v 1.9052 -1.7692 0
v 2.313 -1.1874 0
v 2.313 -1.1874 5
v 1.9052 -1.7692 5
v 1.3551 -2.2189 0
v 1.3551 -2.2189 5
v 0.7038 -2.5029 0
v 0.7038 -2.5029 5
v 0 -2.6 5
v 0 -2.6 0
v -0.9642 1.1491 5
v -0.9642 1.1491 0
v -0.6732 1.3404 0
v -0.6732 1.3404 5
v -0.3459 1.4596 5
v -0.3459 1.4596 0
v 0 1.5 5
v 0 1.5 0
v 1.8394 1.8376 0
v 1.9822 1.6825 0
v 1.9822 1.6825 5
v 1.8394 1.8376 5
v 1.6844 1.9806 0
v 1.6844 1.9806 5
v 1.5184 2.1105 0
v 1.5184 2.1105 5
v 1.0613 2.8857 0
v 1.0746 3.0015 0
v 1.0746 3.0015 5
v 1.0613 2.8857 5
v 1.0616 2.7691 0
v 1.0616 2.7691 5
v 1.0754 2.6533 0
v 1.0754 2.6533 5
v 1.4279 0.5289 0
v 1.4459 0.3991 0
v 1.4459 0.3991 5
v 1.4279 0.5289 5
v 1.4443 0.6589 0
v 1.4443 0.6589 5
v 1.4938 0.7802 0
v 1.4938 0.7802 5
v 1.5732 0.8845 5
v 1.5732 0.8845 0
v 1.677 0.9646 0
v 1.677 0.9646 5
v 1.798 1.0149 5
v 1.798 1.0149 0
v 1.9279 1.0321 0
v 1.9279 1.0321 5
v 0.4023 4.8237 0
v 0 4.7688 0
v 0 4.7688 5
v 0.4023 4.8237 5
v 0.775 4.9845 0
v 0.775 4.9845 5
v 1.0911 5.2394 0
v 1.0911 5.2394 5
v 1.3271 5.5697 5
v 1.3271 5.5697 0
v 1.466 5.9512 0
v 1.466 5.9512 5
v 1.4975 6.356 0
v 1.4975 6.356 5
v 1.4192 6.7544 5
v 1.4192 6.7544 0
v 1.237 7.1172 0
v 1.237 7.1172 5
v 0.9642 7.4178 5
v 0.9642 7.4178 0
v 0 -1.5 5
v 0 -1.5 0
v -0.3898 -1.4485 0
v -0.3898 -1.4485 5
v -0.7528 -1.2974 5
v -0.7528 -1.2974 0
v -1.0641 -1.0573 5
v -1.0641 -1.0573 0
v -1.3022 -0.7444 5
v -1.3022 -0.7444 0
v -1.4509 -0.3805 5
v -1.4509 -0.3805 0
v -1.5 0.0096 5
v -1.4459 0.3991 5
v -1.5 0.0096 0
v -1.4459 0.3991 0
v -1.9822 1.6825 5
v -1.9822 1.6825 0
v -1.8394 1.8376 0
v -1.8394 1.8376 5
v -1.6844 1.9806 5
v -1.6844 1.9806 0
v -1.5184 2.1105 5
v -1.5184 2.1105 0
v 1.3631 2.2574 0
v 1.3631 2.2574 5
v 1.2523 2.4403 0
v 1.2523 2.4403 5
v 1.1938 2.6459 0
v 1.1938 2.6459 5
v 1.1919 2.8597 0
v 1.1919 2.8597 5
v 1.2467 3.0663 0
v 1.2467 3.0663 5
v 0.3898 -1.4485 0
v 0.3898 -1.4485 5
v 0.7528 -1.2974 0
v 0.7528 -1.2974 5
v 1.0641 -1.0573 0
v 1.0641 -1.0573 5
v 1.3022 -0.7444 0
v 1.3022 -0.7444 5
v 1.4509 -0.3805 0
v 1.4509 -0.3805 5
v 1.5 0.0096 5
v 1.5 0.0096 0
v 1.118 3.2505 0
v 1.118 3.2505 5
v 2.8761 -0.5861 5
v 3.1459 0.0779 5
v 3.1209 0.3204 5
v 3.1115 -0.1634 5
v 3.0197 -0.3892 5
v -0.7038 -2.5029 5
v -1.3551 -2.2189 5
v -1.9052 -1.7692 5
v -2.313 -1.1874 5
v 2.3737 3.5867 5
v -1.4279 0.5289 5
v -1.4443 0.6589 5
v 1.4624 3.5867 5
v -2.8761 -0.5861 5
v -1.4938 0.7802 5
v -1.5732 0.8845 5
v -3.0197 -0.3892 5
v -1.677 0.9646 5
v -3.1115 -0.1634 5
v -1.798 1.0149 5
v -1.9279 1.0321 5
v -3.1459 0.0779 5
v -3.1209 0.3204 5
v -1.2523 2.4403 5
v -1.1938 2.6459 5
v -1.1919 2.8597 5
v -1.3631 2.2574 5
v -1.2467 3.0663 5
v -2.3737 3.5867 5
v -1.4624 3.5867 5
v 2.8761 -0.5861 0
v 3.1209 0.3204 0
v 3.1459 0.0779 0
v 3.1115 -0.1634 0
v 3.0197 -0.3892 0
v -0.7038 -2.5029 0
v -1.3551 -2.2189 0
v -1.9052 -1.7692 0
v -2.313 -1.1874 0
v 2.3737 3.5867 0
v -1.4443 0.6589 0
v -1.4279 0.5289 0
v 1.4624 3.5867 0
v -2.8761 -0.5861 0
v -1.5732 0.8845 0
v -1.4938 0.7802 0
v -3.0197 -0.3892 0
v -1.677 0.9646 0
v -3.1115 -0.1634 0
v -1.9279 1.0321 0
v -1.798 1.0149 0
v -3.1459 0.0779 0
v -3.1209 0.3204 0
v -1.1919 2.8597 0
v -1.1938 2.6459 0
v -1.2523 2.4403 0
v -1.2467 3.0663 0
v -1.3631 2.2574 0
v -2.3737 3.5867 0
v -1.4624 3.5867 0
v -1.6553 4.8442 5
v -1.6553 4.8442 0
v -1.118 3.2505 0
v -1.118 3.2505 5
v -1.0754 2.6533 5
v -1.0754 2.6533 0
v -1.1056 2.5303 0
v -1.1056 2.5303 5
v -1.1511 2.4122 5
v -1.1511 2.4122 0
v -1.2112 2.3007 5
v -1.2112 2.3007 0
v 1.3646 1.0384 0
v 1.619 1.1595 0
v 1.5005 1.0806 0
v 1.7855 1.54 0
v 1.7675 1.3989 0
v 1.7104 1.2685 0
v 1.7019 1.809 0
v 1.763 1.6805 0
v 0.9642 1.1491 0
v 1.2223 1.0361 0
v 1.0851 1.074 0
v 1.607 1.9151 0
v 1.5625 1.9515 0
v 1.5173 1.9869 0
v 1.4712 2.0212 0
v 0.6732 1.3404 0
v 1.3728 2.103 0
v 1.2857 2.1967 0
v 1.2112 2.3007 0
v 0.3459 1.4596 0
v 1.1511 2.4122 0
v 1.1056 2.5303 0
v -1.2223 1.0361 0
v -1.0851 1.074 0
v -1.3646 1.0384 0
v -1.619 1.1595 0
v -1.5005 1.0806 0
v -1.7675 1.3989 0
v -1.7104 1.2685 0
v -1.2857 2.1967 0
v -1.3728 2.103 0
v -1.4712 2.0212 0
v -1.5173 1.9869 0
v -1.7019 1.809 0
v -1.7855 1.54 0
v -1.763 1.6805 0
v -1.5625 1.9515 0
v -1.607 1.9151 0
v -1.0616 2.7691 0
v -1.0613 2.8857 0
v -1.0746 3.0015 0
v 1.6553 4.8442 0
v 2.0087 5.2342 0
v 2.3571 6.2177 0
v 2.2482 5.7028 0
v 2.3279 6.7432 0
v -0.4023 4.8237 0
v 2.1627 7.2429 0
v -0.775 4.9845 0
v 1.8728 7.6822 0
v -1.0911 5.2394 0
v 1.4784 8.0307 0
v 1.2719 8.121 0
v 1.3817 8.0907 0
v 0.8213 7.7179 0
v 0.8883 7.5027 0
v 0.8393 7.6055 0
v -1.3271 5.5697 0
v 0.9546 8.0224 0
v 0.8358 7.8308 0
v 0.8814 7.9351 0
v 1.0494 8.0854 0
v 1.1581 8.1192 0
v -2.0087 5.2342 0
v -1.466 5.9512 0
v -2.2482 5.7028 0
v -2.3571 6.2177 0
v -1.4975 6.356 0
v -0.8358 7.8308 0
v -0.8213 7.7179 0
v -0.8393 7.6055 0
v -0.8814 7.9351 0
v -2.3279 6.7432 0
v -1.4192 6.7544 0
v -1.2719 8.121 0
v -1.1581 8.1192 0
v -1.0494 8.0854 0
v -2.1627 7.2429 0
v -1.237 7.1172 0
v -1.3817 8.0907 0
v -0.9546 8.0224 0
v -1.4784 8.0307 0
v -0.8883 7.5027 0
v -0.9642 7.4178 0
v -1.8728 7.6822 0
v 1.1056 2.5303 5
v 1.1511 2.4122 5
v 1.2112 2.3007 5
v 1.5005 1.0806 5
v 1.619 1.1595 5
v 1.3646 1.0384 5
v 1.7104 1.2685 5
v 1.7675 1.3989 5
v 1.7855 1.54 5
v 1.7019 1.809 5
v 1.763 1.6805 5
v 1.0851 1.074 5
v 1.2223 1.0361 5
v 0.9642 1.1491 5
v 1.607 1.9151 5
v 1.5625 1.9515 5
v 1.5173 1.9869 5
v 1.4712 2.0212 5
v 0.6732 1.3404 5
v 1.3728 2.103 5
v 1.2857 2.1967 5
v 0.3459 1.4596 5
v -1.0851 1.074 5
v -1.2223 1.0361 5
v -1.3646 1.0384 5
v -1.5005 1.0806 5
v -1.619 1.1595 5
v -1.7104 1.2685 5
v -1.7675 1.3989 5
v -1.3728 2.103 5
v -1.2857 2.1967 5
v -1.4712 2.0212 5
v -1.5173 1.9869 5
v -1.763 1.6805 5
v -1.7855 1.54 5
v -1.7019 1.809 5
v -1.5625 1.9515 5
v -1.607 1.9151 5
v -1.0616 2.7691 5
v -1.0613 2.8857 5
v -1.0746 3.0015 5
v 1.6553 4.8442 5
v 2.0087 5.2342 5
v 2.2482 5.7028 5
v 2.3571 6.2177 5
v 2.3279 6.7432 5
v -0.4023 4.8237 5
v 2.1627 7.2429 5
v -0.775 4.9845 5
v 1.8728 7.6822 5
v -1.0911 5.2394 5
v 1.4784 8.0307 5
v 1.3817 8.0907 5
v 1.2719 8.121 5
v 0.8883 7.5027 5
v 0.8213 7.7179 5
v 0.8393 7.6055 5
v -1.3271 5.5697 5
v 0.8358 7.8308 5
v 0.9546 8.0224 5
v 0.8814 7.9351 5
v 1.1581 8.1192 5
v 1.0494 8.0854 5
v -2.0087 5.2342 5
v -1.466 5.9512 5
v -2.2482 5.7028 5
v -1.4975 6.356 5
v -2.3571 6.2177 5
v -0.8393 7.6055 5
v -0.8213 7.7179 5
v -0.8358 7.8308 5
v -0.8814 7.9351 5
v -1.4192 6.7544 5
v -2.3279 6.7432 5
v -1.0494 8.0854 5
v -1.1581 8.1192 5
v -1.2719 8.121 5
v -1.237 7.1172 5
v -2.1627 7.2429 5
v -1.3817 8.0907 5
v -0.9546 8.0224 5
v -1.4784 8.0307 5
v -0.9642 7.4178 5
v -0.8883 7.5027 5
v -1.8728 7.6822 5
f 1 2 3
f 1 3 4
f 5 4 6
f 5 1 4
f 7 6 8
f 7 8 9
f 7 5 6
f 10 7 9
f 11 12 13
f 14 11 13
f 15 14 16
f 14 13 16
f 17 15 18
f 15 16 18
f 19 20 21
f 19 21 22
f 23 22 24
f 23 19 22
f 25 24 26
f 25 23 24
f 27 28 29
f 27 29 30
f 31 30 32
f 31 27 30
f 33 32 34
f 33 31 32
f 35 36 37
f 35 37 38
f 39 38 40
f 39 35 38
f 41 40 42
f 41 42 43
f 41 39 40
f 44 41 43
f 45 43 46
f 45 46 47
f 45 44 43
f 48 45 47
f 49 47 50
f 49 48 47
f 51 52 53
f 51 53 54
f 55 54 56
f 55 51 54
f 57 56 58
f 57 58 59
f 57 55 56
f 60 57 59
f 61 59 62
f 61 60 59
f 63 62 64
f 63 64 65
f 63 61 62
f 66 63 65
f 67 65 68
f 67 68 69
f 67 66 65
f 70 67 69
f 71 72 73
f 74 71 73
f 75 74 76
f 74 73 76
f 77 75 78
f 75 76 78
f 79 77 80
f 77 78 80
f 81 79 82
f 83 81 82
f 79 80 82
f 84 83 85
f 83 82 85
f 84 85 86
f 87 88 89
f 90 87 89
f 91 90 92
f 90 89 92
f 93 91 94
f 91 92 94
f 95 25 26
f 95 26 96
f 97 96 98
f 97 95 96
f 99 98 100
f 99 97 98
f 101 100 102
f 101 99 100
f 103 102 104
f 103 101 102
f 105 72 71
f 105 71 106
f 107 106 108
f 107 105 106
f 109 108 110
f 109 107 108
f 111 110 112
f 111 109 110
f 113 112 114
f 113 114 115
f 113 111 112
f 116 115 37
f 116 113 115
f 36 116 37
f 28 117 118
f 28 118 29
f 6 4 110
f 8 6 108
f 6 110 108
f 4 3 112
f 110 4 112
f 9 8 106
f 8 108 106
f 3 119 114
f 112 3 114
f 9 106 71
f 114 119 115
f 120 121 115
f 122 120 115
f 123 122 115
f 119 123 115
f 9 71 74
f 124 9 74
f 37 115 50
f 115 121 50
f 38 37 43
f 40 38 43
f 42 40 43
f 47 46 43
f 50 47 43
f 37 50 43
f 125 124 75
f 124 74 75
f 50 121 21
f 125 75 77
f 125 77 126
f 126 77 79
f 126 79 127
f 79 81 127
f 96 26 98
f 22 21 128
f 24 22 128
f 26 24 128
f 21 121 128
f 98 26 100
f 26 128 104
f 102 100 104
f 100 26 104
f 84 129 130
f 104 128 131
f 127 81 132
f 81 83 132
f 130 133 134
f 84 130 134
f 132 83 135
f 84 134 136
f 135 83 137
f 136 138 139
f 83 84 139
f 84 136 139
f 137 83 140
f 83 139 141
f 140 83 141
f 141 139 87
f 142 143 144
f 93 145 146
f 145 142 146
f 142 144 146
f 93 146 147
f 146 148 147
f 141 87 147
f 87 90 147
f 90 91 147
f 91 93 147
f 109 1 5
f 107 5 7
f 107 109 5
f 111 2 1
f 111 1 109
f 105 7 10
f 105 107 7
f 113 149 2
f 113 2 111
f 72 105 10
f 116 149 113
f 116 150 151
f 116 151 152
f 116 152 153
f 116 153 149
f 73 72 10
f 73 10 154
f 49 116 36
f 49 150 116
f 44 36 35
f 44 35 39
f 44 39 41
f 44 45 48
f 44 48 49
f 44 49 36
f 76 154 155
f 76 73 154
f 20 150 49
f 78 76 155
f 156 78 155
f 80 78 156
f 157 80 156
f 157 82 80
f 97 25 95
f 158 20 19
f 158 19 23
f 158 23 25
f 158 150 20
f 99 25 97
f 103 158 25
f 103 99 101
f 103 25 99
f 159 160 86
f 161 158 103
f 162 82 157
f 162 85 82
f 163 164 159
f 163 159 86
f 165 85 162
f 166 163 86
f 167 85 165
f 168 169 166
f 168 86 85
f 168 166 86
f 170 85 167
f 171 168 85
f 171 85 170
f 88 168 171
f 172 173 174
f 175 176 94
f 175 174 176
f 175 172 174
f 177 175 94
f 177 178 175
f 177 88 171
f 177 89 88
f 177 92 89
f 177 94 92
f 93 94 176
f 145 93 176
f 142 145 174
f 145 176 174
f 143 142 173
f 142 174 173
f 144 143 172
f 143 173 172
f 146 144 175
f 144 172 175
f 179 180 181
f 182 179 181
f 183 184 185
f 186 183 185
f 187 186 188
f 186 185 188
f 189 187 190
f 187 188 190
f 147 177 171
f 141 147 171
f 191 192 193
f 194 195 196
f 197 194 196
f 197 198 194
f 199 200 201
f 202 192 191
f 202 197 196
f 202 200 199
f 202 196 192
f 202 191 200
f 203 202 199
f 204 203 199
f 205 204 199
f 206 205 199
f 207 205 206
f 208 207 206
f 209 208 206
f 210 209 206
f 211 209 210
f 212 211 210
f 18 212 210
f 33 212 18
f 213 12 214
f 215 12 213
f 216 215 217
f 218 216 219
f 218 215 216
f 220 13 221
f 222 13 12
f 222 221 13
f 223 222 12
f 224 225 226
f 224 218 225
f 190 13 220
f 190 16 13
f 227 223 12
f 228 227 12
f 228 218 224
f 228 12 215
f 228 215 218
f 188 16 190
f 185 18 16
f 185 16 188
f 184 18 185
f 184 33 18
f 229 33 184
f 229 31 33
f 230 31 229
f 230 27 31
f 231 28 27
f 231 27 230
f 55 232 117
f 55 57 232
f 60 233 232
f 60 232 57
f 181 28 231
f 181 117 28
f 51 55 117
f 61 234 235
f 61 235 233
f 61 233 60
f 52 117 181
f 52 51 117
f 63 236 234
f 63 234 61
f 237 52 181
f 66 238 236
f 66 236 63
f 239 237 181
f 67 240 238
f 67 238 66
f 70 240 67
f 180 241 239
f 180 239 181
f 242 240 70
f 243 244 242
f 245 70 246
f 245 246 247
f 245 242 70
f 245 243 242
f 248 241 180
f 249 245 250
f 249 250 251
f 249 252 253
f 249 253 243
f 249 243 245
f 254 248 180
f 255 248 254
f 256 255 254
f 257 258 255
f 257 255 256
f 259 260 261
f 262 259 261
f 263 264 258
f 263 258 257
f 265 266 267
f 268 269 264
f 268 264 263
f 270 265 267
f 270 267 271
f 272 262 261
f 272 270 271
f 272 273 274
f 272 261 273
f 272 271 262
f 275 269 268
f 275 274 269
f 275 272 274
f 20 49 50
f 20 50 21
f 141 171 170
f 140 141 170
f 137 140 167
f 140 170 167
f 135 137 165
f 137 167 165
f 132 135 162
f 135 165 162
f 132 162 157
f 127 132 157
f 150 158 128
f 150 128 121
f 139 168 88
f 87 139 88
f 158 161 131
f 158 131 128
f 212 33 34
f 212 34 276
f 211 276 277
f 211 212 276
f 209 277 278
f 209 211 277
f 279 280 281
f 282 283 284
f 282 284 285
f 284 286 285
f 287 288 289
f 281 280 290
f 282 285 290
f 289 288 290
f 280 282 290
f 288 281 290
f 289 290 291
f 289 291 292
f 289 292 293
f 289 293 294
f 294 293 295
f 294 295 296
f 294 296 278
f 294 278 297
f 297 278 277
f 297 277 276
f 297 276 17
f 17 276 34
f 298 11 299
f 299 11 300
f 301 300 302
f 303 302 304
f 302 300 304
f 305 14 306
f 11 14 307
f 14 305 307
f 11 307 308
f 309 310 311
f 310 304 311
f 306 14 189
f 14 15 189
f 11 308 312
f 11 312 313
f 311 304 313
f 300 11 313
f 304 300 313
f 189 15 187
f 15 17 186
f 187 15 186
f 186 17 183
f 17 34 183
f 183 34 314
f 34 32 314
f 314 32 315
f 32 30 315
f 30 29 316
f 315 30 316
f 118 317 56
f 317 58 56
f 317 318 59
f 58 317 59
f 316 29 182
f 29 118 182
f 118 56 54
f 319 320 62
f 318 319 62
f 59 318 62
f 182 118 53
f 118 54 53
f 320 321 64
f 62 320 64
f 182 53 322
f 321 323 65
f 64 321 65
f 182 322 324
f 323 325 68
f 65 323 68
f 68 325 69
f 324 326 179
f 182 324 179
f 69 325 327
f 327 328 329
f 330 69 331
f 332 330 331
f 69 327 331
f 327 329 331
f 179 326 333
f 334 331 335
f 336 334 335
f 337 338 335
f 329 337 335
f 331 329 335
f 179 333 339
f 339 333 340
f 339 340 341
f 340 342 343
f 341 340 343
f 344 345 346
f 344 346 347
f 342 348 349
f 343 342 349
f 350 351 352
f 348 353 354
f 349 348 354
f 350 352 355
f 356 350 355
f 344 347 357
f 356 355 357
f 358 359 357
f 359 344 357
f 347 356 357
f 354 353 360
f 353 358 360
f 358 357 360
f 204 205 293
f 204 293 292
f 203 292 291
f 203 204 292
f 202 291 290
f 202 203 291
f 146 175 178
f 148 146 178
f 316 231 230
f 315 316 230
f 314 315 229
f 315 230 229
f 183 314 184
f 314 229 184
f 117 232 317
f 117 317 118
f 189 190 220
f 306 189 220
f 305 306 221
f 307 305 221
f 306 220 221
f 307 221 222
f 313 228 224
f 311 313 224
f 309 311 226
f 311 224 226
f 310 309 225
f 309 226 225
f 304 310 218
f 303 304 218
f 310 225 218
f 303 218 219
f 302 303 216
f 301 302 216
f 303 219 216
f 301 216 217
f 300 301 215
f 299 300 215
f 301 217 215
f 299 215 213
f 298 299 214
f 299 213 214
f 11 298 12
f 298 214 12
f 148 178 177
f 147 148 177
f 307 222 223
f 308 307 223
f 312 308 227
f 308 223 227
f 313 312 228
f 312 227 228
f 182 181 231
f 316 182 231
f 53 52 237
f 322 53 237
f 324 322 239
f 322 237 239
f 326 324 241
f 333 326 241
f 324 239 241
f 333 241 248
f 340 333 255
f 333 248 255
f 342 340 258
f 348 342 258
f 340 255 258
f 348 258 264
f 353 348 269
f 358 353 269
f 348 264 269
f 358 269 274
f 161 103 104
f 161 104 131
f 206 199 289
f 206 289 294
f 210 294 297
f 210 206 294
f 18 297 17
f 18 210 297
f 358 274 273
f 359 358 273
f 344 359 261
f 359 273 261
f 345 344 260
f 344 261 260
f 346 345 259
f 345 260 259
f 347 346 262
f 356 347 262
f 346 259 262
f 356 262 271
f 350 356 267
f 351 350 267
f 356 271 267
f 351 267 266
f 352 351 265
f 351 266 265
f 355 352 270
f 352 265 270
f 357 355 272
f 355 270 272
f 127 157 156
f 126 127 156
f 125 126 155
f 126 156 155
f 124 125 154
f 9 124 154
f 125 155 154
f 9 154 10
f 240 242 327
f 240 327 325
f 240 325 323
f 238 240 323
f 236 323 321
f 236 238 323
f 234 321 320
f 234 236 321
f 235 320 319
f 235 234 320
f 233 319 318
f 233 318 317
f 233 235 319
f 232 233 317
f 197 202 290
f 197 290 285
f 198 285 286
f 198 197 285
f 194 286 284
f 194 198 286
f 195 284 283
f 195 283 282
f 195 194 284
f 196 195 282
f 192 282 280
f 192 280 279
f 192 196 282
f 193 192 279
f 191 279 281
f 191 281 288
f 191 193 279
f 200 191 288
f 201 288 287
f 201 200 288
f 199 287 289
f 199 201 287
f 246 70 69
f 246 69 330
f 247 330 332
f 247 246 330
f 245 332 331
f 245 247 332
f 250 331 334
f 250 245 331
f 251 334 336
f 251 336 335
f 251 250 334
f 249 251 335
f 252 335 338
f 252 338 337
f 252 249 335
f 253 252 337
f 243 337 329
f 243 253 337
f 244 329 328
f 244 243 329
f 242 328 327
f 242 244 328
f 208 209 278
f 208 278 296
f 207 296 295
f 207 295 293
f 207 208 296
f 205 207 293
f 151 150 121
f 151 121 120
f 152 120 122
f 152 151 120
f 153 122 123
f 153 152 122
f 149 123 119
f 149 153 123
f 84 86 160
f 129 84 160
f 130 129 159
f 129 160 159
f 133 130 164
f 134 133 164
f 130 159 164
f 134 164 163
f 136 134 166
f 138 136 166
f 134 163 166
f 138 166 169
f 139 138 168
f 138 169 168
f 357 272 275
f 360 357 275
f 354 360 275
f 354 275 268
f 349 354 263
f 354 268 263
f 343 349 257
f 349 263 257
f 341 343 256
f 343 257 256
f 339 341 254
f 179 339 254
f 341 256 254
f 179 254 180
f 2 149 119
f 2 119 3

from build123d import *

# Parameters (mm, degrees)
F1_DEPTH = 5
F2_DEPTH = 5
F3_DEPTH = 5


with BuildPart() as f1:
    # F0 (on Top) → F1 (new body)
    with BuildSketch(Plane.XY):
        with BuildLine():
            Line((0, 1.5), (0, 2))
            Line((0, 2), (0, 2.6))
            Line((0, 2.6), (0, 3.047834))
            Line((0, 3.047834), (0, 4.768772))
            ThreePointArc((0, 4.768772), (-1.409539, 5.755742), (-0.964181, 7.417838))
            ThreePointArc((-0.964181, 7.417838), (-0.914879, 7.981371), (-1.478412, 8.030674))
            ThreePointArc((-1.478412, 8.030674), (-2.35988, 6.481458), (-1.65526, 4.844214))
            Line((-1.65526, 4.844214), (-1.118016, 3.250457))
            Line((-1.118016, 3.250457), (-1.074608, 3.001549))
            ThreePointArc((-1.074608, 3.001549), (-1.059742, 2.827399), (-1.075426, 2.65332))
            ThreePointArc((-1.075426, 2.65332), (-1.126488, 2.470524), (-1.211167, 2.300668))
            ThreePointArc((-1.211167, 2.300668), (-1.327748, 2.148434), (-1.471242, 2.021249))
            ThreePointArc((-1.471242, 2.021249), (-1.54002, 1.969349), (-1.606969, 1.915111))
            ThreePointArc((-1.606969, 1.915111), (-1.668597, 1.210695), (-0.964181, 1.149067))
            ThreePointArc((-0.964181, 1.149067), (-0.51303, 1.409539), (0, 1.5))
        make_face()
    extrude(amount=F1_DEPTH)

    # F5: F1 across plane


with BuildPart() as f2:
    # F0 (on Top) → F2 (new body)
    with BuildSketch(Plane.XY):
        with BuildLine():
            ThreePointArc((0, -1.5), (-1.19344, -0.90868), (-1.445941, 0.399067))
            ThreePointArc((-1.445941, 0.399067), (-1.530108, 0.834982), (-1.927922, 1.032089))
            Line((-1.927922, 1.032089), (-1.98219, 1.682534))
            ThreePointArc((-1.98219, 1.682534), (-1.763353, 1.910651), (-1.518449, 2.110524))
            ThreePointArc((-1.518449, 2.110524), (-1.216168, 2.541111), (-1.246668, 3.066324))
            Line((-1.246668, 3.066324), (-1.462441, 3.586727))
            Line((-1.462441, 3.586727), (-2.373682, 3.586727))
            Line((-2.373682, 3.586727), (-3.120906, 0.320398))
            ThreePointArc((-3.120906, 0.320398), (-3.111491, -0.163373), (-2.876052, -0.586093))
            Line((-2.876052, -0.586093), (-2.313016, -1.187417))
            ThreePointArc((-2.313016, -1.187417), (-1.355123, -2.218928), (0, -2.6))
            Line((0, -2.6), (0, -2.5))
            Line((0, -2.5), (0, -1.5))
        make_face()
    extrude(amount=F2_DEPTH)

    # F0 (on Top) → F3 (join)
    with BuildSketch(Plane.XY):
        with BuildLine():
            ThreePointArc((0, -1.5), (-1.19344, -0.90868), (-1.445941, 0.399067))
            ThreePointArc((-1.445941, 0.399067), (-1.530108, 0.834982), (-1.927922, 1.032089))
            Line((-1.927922, 1.032089), (-1.98219, 1.682534))
            ThreePointArc((-1.98219, 1.682534), (-1.763353, 1.910651), (-1.518449, 2.110524))
            ThreePointArc((-1.518449, 2.110524), (-1.216168, 2.541111), (-1.246668, 3.066324))
            Line((-1.246668, 3.066324), (-1.462441, 3.586727))
            Line((-1.462441, 3.586727), (-2.373682, 3.586727))
            Line((-2.373682, 3.586727), (-3.120906, 0.320398))
            ThreePointArc((-3.120906, 0.320398), (-3.111491, -0.163373), (-2.876052, -0.586093))
            Line((-2.876052, -0.586093), (-2.313016, -1.187417))
            ThreePointArc((-2.313016, -1.187417), (-1.355123, -2.218928), (0, -2.6))
            Line((0, -2.6), (0, -2.5))
            Line((0, -2.5), (0, -1.5))
        make_face()
    extrude(amount=F3_DEPTH)

    # F4: F2 across plane


with BuildPart() as f2_1:
    add(f2.part)
    add(f2.part.mirror(Plane.YZ))


with BuildPart() as f1_1:
    add(f1.part)
    add(f1.part.mirror(Plane.YZ))


solid = Compound([f2_1.part, f1_1.part])
